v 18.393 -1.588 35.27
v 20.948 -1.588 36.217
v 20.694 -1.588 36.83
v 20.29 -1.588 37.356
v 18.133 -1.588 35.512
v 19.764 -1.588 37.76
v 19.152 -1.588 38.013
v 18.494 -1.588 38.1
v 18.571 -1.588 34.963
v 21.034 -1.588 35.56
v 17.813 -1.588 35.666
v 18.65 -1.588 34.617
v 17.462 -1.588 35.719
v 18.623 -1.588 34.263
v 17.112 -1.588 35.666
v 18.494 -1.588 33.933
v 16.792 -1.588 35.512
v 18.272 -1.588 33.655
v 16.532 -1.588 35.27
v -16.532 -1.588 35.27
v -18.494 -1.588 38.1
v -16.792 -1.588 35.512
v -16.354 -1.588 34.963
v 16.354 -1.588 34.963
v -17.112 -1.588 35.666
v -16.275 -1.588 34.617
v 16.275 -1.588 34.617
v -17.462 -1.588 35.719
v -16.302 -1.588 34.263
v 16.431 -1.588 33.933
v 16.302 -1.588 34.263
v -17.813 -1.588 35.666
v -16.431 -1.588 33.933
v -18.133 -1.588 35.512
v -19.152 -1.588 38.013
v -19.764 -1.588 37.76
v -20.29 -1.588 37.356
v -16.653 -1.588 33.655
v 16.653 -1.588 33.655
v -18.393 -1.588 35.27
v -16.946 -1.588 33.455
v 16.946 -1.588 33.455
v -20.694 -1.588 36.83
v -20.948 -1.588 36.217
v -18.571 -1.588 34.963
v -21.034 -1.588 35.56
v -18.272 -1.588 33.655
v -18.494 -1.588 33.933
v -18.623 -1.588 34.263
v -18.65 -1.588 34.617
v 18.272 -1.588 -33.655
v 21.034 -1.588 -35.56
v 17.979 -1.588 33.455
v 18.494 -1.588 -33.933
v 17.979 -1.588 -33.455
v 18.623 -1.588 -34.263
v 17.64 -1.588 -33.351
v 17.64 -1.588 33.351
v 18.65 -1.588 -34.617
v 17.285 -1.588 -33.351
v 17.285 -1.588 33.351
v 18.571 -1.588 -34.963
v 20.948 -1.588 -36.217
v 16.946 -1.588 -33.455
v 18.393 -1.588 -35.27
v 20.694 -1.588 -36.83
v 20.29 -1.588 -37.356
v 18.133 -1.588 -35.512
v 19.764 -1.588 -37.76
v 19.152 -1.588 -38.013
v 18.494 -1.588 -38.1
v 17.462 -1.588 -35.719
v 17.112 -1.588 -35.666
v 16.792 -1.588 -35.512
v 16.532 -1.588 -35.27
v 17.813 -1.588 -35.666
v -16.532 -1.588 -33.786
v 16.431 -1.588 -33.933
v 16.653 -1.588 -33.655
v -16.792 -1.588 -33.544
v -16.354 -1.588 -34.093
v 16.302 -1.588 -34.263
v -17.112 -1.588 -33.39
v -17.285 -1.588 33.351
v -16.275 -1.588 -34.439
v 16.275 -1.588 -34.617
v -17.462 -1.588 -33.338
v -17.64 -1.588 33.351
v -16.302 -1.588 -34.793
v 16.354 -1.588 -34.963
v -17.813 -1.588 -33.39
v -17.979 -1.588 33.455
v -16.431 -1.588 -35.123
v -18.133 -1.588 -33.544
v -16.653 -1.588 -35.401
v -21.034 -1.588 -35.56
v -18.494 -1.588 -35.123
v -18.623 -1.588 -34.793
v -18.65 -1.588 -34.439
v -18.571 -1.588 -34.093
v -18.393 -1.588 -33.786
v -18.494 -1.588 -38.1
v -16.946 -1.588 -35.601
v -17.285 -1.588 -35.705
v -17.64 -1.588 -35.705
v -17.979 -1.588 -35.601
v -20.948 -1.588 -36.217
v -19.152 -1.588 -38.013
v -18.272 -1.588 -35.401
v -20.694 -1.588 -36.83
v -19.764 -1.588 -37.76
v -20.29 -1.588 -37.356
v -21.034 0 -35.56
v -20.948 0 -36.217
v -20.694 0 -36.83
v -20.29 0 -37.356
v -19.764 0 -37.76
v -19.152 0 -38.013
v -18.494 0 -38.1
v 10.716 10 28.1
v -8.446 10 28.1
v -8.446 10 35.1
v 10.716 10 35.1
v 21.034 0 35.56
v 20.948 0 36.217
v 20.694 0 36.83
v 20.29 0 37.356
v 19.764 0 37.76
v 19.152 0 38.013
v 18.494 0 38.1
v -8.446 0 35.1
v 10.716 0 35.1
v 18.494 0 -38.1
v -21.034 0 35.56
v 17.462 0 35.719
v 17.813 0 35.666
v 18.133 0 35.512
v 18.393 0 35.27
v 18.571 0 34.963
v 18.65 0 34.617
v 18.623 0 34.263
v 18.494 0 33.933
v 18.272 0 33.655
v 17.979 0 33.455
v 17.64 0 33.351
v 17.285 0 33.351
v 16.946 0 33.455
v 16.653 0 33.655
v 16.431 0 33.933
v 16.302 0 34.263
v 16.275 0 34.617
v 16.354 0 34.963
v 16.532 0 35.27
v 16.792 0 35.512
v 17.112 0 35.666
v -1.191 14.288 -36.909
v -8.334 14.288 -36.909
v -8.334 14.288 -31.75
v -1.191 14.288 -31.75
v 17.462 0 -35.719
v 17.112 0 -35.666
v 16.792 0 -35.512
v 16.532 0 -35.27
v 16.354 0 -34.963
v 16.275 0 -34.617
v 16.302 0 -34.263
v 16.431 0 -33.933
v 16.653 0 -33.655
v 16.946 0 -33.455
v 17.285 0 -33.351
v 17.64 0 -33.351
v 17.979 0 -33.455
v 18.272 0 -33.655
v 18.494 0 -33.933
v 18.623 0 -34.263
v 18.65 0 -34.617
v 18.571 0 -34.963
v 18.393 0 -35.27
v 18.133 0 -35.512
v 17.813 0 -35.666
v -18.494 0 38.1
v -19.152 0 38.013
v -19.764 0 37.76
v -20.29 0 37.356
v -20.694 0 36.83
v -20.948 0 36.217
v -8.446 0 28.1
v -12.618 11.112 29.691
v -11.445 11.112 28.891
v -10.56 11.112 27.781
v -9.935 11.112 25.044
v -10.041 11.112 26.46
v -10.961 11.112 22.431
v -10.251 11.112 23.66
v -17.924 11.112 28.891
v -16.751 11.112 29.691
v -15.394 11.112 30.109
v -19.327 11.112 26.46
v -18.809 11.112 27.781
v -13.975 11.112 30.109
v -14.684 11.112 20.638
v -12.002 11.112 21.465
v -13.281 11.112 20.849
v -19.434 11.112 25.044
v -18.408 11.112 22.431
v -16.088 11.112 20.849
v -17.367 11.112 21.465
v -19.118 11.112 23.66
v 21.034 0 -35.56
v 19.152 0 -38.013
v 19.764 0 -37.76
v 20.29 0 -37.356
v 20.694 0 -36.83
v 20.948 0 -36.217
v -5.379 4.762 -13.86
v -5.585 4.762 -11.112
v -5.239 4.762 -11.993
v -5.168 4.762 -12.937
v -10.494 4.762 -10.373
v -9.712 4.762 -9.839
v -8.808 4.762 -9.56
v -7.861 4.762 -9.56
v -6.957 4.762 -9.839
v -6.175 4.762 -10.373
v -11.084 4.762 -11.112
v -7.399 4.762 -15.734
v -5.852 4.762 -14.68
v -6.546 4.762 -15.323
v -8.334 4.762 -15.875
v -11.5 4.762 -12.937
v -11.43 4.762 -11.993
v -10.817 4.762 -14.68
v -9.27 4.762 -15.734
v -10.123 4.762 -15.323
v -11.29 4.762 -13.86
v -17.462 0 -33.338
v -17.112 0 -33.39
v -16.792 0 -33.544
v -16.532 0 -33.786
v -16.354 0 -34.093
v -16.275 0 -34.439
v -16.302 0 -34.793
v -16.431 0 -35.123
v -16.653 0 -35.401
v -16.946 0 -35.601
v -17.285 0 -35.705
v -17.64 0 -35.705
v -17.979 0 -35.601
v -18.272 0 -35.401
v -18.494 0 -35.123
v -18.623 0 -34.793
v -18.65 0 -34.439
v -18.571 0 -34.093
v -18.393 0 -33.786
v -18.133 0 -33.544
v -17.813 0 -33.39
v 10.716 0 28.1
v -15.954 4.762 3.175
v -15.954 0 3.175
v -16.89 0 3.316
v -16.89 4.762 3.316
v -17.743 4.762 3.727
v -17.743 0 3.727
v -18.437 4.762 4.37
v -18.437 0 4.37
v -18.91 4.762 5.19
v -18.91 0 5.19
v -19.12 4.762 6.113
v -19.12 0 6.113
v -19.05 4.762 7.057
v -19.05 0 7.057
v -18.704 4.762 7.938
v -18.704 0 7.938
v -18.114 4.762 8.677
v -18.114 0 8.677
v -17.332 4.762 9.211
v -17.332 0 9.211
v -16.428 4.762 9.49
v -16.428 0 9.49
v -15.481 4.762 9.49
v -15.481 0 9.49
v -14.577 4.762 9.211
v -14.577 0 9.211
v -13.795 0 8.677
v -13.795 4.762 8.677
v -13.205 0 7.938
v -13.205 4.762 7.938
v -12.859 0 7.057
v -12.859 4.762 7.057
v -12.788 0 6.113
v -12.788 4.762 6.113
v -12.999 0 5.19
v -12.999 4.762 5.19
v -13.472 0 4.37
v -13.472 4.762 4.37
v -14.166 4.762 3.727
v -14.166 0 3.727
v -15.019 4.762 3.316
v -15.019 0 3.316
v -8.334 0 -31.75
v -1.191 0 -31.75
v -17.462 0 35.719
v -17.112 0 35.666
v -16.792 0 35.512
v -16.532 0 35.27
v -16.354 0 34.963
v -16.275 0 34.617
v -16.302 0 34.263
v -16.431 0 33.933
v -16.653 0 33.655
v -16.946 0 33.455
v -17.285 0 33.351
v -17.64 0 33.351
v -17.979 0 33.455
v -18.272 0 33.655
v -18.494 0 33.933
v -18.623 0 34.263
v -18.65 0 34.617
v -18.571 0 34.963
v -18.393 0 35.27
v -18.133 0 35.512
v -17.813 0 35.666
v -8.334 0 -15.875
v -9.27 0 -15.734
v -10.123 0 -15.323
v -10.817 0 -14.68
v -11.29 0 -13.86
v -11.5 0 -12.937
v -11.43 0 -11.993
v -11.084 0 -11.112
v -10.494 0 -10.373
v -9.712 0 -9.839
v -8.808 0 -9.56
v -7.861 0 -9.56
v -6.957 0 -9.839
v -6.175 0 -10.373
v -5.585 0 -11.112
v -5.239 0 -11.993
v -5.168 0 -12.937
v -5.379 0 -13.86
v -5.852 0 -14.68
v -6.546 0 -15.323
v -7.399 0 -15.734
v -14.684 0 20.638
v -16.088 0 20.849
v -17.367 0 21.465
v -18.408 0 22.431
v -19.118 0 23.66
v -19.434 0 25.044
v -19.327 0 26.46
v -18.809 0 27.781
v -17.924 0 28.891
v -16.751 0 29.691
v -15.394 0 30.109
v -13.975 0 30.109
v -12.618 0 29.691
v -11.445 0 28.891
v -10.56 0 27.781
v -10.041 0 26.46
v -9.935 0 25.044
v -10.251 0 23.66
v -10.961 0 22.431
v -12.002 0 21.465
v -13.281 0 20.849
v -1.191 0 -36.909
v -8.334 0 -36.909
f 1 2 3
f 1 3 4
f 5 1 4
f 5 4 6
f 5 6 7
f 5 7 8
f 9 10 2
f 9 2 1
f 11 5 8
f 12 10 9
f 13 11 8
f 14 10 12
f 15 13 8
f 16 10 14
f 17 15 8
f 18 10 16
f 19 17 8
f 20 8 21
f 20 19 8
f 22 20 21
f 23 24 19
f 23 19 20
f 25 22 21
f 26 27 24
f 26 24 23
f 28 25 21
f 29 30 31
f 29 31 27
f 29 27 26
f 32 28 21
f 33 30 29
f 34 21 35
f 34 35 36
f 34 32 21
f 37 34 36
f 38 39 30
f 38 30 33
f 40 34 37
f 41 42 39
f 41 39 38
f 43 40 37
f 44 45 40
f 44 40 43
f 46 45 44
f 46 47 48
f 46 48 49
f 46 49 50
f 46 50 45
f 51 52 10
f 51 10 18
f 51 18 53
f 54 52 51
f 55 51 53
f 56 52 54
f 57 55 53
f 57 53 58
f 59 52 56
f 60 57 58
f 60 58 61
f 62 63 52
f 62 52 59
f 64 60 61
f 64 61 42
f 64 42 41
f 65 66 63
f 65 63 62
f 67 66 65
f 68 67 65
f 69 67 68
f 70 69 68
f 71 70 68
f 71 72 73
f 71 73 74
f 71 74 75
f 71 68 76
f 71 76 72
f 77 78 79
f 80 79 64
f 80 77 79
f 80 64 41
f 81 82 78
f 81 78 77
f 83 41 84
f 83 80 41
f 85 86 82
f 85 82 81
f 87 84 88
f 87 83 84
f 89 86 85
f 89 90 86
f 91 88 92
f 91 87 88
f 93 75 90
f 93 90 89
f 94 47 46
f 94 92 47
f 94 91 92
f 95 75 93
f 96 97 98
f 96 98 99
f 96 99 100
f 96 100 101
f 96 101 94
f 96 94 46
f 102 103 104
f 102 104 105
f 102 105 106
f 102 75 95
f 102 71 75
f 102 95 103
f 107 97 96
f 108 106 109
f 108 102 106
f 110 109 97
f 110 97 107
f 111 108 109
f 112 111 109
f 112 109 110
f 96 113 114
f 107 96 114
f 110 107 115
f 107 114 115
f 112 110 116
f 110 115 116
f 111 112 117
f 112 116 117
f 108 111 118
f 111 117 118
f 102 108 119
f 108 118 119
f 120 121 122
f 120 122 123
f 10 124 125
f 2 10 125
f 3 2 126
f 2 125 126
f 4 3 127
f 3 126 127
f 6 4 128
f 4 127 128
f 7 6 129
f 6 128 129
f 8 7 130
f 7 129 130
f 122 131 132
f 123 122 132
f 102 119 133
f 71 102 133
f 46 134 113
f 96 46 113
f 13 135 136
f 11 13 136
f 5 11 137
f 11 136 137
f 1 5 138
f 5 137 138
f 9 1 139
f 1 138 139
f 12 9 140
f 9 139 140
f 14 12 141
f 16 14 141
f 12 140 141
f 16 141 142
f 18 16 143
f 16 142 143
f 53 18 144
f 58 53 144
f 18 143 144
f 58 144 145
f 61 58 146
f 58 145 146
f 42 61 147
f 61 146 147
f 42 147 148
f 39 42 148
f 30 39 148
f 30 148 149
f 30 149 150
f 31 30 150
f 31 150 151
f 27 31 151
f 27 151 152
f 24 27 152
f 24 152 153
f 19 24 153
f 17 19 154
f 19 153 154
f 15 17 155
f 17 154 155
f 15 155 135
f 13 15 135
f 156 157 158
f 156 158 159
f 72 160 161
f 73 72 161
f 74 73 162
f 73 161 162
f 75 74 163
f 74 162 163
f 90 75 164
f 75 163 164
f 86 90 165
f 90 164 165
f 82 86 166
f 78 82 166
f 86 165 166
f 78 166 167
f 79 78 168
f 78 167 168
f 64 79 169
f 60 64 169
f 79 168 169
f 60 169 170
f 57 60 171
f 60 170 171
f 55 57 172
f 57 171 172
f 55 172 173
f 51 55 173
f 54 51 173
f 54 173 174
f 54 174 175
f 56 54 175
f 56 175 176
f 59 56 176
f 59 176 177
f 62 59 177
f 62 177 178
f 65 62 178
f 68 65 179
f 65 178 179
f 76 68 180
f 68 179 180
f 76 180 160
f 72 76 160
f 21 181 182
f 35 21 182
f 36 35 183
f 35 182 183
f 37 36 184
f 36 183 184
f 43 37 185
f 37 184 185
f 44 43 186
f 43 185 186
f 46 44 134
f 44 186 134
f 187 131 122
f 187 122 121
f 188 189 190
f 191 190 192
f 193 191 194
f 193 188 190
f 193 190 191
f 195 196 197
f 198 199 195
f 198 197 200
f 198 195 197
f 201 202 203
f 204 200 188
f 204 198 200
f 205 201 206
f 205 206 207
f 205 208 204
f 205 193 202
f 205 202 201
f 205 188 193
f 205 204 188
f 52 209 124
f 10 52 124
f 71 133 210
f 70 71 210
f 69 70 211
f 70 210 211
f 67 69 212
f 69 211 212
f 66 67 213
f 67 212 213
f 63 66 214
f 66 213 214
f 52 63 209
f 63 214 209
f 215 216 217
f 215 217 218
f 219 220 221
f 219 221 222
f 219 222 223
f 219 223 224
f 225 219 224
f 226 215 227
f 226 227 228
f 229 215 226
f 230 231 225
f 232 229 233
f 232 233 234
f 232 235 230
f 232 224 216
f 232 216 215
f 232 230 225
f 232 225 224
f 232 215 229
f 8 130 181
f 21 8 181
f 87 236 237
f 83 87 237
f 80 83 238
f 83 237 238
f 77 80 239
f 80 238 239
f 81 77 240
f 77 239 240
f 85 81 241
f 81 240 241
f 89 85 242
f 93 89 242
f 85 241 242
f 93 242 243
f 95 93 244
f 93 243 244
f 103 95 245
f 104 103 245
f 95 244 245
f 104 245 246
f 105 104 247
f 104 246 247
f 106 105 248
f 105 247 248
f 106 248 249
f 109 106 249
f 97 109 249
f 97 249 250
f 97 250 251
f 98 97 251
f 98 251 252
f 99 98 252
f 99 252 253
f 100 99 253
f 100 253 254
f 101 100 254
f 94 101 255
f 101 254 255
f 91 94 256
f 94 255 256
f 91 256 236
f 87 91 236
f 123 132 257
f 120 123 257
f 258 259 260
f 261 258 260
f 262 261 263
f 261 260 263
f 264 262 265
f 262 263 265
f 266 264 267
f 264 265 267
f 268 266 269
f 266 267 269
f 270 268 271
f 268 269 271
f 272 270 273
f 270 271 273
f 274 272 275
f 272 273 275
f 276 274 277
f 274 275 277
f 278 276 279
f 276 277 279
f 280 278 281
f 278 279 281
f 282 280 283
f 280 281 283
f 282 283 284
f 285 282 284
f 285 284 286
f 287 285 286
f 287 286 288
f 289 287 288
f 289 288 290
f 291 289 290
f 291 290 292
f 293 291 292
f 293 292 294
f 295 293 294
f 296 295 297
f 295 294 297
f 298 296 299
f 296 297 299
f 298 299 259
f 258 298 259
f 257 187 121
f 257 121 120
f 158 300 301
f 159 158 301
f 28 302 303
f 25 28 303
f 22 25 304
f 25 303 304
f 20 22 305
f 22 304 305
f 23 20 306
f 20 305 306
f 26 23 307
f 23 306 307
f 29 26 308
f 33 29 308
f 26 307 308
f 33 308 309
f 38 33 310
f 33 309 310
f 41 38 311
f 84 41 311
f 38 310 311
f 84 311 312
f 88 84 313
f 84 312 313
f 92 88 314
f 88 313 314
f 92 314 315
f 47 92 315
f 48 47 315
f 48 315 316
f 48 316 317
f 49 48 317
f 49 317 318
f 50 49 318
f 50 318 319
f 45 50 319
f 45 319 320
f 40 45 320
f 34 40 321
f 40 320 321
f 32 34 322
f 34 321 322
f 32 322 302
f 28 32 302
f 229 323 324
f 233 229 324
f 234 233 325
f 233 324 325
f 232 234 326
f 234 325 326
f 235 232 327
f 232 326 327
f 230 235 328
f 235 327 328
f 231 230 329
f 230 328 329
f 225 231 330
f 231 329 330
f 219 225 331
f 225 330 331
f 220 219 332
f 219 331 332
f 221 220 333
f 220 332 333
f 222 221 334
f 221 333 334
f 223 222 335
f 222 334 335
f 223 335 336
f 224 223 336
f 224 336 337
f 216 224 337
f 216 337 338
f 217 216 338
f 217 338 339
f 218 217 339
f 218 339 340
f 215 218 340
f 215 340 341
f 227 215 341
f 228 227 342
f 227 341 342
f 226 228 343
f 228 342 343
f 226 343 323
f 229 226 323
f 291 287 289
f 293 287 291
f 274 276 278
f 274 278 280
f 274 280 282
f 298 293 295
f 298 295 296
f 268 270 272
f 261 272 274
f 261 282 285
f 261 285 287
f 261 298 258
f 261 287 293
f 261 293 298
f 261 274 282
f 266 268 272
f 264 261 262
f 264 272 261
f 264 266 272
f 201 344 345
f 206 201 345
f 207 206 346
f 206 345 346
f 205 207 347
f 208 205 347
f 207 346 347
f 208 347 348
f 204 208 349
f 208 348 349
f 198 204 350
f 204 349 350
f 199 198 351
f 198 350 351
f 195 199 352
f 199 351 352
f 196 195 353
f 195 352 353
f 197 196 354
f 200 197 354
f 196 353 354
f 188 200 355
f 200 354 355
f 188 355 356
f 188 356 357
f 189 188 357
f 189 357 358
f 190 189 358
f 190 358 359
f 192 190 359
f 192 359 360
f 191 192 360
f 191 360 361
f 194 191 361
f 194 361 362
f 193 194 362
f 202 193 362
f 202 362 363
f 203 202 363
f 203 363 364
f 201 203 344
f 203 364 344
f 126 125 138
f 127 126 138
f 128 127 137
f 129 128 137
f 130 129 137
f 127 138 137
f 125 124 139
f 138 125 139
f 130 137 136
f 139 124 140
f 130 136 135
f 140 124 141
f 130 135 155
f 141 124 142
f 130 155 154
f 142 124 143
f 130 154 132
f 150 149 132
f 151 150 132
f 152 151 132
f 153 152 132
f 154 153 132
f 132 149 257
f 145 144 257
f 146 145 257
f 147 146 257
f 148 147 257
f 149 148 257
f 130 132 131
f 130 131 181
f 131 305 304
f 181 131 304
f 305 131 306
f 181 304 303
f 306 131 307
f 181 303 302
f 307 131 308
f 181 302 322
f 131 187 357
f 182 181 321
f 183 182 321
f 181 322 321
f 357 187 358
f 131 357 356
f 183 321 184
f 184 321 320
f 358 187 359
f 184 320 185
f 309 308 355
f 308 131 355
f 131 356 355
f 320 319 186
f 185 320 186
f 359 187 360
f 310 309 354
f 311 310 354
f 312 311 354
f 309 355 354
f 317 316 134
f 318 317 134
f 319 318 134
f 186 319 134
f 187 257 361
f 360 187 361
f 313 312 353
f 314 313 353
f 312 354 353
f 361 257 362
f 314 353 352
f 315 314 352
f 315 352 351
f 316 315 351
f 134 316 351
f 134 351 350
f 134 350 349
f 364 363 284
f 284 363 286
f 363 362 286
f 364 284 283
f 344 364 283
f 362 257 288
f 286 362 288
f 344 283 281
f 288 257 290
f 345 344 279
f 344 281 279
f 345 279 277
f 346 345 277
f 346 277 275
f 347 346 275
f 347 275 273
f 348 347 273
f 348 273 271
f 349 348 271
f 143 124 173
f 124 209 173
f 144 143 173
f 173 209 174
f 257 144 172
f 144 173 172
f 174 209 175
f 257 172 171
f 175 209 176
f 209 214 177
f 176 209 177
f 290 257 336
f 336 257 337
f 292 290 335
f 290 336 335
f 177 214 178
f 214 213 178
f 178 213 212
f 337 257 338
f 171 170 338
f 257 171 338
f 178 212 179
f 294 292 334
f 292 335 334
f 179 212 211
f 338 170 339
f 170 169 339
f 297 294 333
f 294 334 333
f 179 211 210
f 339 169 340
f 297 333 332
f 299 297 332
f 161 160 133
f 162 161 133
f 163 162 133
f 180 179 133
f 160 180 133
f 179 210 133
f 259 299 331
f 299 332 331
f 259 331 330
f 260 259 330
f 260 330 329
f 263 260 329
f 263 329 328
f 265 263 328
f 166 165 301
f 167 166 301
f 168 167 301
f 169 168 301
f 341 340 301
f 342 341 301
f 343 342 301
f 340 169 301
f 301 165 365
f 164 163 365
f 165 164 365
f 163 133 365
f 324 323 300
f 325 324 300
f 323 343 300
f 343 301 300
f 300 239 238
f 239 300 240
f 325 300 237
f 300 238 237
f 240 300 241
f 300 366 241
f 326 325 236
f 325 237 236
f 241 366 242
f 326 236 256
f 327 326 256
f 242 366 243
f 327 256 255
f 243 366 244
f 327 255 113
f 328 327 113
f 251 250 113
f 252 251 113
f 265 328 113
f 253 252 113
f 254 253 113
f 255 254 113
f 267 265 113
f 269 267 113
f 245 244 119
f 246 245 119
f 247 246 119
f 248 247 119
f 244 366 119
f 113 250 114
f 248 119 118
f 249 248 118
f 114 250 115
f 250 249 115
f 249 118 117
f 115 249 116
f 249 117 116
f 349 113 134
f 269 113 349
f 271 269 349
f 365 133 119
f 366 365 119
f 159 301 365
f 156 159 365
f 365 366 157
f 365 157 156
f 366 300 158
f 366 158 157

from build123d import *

# Parameters (mm, degrees)
SKETCH1_W           = 7.14375
SKETCH1_H           = 5.159375
BOSS_EXTRUDE1_DEPTH = 14.2875
SKETCH1_3_W         = 19.161125
SKETCH1_3_H         = 7
BOSS_EXTRUDE2_DEPTH = 10
BOSS_EXTRUDE3_DEPTH = 1.5875
SKETCH1_5_R         = 1.190625
CUT_EXTRUDE1_DEPTH  = 1.5875
SKETCH2_R           = 4.7625
BOSS_EXTRUDE4_DEPTH = 11.1125
SKETCH2_3_R         = 3.175
BOSS_EXTRUDE5_DEPTH = 4.7625


with BuildPart() as part:
    # Sketch1 → Boss-Extrude1 (new body)
    with BuildSketch(Plane(origin=(0, 0, 0), x_dir=(1, 0, 0), z_dir=(0, 1, 0))):
        with Locations((-4.7625, 34.3296875)):
            Rectangle(SKETCH1_W, SKETCH1_H)
    extrude(amount=BOSS_EXTRUDE1_DEPTH)



with BuildPart() as body_2:
    # Sketch1<3> → Boss-Extrude2 (new body)
    with BuildSketch(Plane(origin=(0, 0, 0), x_dir=(1, 0, 0), z_dir=(0, 1, 0))):
        with Locations((1.1350625, -31.6)):
            Rectangle(SKETCH1_3_W, SKETCH1_3_H)
    extrude(amount=BOSS_EXTRUDE2_DEPTH)


with BuildPart() as part_1:
    add(part.part)

    add(body_2.part)  # Boss-Extrude3 merges body 2
    # Sketch1<4> → Boss-Extrude3 (add)
    with BuildSketch(Plane(origin=(0, 0, 0), x_dir=(1, 0, 0), z_dir=(0, 1, 0))):
        with BuildLine():
            Line((18.494375, -38.1), (-18.494375, -38.1))
            ThreePointArc((-18.494375, -38.1), (-20.290426224, -37.356051224), (-21.034375, -35.56))
            Line((-21.034375, -35.56), (-21.034375, 35.56))
            ThreePointArc((-21.034375, 35.56), (-20.290426224, 37.356051224), (-18.494375, 38.1))
            Line((-18.494375, 38.1), (18.494375, 38.1))
            ThreePointArc((18.494375, 38.1), (20.290426224, 37.356051224), (21.034375, 35.56))
            Line((21.034375, 35.56), (21.034375, -35.56))
            ThreePointArc((21.034375, -35.56), (20.290426224, -37.356051224), (18.494375, -38.1))
        make_face()
    extrude(amount=-BOSS_EXTRUDE3_DEPTH)

    # Sketch1<5> → Cut-Extrude1 (cut)
    with BuildSketch(Plane(origin=(0, 0, 0), x_dir=(1, 0, 0), z_dir=(0, 1, 0))):
        with Locations((-17.4625, 34.528125)):
            Circle(SKETCH1_5_R)
        with Locations((17.4625, 34.528125)):
            Circle(SKETCH1_5_R)
        with Locations((17.4625, -34.528125)):
            Circle(SKETCH1_5_R)
        with Locations((-17.4625, -34.528125)):
            Circle(SKETCH1_5_R)
    extrude(amount=-CUT_EXTRUDE1_DEPTH, mode=Mode.SUBTRACT)

    # Sketch2 → Boss-Extrude4 (add)
    with BuildSketch(Plane(origin=(0, 0, 0), x_dir=(1, 0, 0), z_dir=(0, 1, 0))):
        with Locations((-14.684375, -25.4)):
            Circle(SKETCH2_R)
    extrude(amount=BOSS_EXTRUDE4_DEPTH)

    # Sketch2<3> → Boss-Extrude5 (add)
    with BuildSketch(Plane(origin=(0, 0, 0), x_dir=(1, 0, 0), z_dir=(0, 1, 0))):
        with Locations((-15.954375, -6.35)):
            Circle(SKETCH2_3_R)
        with Locations((-8.334375, 12.7)):
            Circle(SKETCH2_3_R)
    extrude(amount=BOSS_EXTRUDE5_DEPTH)


solid = part_1.part
